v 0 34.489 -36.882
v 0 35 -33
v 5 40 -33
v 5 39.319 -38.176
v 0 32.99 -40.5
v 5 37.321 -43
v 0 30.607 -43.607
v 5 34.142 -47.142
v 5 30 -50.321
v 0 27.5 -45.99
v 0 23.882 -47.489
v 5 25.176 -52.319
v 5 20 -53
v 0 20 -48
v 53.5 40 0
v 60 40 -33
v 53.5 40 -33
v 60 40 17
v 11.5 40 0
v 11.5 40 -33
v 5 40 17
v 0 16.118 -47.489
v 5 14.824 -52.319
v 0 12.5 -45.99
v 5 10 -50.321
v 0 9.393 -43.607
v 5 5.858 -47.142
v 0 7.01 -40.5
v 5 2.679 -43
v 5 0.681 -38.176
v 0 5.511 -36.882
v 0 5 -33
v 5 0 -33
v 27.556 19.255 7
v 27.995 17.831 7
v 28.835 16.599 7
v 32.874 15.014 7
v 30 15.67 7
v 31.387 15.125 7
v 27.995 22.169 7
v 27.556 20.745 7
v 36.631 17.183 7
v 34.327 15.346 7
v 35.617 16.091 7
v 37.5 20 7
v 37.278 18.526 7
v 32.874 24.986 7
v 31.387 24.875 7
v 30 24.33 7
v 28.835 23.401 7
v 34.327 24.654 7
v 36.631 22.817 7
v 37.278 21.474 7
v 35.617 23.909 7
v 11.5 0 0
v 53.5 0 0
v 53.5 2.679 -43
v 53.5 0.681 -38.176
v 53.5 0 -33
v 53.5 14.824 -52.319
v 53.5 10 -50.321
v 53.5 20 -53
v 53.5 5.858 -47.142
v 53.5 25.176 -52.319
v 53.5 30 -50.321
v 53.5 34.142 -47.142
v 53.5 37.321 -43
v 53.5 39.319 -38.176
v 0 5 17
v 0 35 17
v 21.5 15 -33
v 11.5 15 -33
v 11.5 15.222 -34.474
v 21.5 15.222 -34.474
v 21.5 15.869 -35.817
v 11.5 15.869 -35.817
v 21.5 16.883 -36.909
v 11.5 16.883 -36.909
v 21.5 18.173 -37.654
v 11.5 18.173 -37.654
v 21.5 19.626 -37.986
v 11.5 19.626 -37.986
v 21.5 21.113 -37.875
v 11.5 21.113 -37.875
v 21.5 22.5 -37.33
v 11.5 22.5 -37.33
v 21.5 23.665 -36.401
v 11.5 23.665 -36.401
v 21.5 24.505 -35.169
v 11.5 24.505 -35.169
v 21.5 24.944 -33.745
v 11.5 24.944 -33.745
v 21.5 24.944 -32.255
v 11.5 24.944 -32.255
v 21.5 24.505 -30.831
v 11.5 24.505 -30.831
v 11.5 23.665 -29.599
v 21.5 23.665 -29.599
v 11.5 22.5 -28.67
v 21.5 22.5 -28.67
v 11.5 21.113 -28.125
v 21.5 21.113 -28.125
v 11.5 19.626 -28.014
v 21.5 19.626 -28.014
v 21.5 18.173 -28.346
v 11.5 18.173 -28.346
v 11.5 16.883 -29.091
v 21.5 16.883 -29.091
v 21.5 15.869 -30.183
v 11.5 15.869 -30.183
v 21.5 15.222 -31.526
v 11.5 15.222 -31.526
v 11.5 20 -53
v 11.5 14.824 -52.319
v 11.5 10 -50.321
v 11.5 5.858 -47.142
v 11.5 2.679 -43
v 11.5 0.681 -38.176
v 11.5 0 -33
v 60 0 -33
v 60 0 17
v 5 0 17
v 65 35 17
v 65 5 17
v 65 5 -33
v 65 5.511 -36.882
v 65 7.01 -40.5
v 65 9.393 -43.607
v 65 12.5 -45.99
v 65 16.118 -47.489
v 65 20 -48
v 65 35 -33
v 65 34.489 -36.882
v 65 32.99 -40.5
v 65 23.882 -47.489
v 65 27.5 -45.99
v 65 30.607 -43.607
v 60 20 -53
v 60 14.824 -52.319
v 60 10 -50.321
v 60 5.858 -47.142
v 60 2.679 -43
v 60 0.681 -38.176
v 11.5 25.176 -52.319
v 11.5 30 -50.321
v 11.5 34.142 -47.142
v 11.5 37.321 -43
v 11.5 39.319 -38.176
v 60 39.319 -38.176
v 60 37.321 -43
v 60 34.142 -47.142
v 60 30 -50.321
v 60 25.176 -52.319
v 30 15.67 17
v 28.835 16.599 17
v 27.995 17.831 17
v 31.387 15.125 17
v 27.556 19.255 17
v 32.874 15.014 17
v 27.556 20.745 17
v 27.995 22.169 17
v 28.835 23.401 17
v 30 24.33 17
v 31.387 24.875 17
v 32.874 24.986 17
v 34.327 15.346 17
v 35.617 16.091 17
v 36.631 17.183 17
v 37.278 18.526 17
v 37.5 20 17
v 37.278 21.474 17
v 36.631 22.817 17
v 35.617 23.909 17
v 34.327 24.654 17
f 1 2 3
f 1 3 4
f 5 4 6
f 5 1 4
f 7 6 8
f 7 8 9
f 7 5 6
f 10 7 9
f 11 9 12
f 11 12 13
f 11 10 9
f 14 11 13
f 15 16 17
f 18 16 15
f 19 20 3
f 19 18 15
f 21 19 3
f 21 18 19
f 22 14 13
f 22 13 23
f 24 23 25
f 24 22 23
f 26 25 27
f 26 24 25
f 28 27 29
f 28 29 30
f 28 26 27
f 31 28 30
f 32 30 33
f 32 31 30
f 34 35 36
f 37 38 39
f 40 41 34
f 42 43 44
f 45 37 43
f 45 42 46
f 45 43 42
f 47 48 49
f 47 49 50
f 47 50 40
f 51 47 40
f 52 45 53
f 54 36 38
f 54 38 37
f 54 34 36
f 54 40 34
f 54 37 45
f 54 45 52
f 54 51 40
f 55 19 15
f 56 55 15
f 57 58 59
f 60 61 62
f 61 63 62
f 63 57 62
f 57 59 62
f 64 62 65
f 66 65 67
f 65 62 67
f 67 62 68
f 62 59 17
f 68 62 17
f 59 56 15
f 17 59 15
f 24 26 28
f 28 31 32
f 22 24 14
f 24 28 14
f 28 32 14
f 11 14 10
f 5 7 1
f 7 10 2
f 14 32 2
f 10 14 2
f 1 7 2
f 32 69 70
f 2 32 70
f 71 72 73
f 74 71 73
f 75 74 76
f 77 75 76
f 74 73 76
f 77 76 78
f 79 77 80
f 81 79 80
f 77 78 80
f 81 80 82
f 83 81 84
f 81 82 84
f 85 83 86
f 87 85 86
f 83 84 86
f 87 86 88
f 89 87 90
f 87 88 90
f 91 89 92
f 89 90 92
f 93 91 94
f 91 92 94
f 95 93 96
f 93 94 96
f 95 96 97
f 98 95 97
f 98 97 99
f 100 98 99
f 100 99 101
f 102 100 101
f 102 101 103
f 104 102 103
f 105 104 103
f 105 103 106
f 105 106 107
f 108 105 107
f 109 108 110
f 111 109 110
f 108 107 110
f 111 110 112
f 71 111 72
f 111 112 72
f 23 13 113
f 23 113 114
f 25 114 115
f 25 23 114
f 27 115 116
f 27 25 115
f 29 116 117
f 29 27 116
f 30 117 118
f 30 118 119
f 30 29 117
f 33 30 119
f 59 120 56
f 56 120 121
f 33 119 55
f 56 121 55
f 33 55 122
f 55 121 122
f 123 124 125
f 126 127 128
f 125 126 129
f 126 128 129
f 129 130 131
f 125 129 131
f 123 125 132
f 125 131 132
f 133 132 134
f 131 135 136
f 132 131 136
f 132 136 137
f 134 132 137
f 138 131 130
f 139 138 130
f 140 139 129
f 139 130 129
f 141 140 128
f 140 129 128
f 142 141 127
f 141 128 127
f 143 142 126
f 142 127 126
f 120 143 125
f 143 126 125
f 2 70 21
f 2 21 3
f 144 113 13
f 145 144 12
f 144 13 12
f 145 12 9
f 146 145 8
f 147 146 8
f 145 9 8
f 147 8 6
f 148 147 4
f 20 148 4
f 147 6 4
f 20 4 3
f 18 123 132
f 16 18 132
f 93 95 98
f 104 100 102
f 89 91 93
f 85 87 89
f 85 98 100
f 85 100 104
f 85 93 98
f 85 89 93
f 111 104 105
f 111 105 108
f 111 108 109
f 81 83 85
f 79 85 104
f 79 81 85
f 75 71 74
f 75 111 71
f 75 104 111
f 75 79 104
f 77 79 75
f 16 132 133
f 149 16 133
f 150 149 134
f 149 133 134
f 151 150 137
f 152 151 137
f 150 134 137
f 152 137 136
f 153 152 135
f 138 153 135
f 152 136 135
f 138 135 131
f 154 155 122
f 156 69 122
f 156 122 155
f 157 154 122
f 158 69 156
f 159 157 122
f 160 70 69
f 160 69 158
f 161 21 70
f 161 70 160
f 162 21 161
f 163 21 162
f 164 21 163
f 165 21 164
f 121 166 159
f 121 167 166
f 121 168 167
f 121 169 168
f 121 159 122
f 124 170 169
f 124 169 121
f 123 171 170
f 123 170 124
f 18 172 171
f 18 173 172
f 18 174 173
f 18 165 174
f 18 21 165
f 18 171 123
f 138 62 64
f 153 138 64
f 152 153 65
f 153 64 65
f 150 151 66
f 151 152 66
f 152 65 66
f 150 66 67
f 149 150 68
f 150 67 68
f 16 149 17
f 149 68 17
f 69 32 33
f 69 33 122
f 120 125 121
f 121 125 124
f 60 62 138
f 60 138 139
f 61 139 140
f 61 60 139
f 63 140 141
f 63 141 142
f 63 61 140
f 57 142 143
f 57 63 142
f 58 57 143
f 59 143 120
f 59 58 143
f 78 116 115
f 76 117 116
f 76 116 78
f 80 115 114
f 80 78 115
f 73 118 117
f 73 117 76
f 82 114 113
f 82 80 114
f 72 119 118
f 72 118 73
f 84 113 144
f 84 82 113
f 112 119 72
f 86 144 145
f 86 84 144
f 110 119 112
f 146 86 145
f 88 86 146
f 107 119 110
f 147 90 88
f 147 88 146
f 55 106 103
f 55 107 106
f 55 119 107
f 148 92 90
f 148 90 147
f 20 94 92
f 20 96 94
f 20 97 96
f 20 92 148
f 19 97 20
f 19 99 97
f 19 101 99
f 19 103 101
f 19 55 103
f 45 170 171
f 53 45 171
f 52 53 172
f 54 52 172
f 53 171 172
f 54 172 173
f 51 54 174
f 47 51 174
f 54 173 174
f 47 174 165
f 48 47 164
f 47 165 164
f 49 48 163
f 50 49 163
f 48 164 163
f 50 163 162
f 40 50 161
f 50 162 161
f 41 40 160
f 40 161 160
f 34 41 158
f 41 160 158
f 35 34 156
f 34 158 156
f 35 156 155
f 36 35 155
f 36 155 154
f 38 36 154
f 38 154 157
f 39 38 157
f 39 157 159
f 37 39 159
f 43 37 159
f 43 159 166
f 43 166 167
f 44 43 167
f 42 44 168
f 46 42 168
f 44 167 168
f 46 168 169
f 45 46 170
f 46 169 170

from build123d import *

# Parameters (mm, degrees)
SKETCH1_W           = 65
SKETCH1_H           = 40
BOSS_EXTRUDE1_DEPTH = 17
SKETCH2_W           = 11.5
SKETCH2_H           = 40
BOSS_EXTRUDE2_DEPTH = 53
FILLET1_R           = 20
CHAMFER1_SIZE       = 5
SKETCH3_R           = 5
CUT_EXTRUDE1_DEPTH  = 10
SKETCH4_R           = 5
BOSS_EXTRUDE3_DEPTH = 10


with BuildPart() as part:
    # Sketch1 → Boss-Extrude1 (new body)
    with BuildSketch(Plane.XY):
        with Locations((32.5, 20)):
            Rectangle(SKETCH1_W, SKETCH1_H)
    extrude(amount=BOSS_EXTRUDE1_DEPTH)

    # Sketch2 → Boss-Extrude2 (add)
    with BuildSketch(Plane(origin=(0, 0, 0), x_dir=(-1, 0, 0), z_dir=(0, 0, -1))):
        with Locations((-5.75, 20)):
            Rectangle(SKETCH2_W, SKETCH2_H)
        with Locations((-59.25, 20)):
            Rectangle(SKETCH2_W, SKETCH2_H)
    extrude(amount=BOSS_EXTRUDE2_DEPTH)

    # Fillet1
    fillet1_edges = [part.edges().sort_by_distance(p)[0] for p in [
        (59.25, 40, -53),
        (5.75, 40, -53),
        (59.25, 0, -53),
        (5.75, 0, -53),
    ]]
    fillet(fillet1_edges, radius=FILLET1_R - 0.0001)  # a hair under: the kernel refuses the full size

    # Chamfer1
    chamfer1_edges = [part.edges().sort_by_distance(p)[0] for p in [
        (65, 5.857835087, -47.142164913),
        (65, 34.142164913, -47.142164913),
        (0, 5.857835087, -47.142164913),
        (0, 34.142164913, -47.142164913),
        (0, 0, -8.00005),
        (65, 0, -8.00005),
        (65, 40, -8.00005),
        (0, 40, -8.00005),
    ]]
    chamfer(chamfer1_edges, length=CHAMFER1_SIZE)

    # Sketch3 → Cut-Extrude1 (cut)
    with BuildSketch(Plane.XY.offset(17)):
        with Locations((32.5, 20)):
            Circle(SKETCH3_R)
    extrude(amount=-CUT_EXTRUDE1_DEPTH, mode=Mode.SUBTRACT)

    # Sketch4 → Boss-Extrude3 (add)
    with BuildSketch(Plane(origin=(11.5, 0, 0), x_dir=(0, 0, -1), z_dir=(1, 0, 0))):
        with Locations(Location((33, 20, 0), (0, 0, 270))):
            Circle(SKETCH4_R)
    extrude(amount=BOSS_EXTRUDE3_DEPTH)


solid = part.part
